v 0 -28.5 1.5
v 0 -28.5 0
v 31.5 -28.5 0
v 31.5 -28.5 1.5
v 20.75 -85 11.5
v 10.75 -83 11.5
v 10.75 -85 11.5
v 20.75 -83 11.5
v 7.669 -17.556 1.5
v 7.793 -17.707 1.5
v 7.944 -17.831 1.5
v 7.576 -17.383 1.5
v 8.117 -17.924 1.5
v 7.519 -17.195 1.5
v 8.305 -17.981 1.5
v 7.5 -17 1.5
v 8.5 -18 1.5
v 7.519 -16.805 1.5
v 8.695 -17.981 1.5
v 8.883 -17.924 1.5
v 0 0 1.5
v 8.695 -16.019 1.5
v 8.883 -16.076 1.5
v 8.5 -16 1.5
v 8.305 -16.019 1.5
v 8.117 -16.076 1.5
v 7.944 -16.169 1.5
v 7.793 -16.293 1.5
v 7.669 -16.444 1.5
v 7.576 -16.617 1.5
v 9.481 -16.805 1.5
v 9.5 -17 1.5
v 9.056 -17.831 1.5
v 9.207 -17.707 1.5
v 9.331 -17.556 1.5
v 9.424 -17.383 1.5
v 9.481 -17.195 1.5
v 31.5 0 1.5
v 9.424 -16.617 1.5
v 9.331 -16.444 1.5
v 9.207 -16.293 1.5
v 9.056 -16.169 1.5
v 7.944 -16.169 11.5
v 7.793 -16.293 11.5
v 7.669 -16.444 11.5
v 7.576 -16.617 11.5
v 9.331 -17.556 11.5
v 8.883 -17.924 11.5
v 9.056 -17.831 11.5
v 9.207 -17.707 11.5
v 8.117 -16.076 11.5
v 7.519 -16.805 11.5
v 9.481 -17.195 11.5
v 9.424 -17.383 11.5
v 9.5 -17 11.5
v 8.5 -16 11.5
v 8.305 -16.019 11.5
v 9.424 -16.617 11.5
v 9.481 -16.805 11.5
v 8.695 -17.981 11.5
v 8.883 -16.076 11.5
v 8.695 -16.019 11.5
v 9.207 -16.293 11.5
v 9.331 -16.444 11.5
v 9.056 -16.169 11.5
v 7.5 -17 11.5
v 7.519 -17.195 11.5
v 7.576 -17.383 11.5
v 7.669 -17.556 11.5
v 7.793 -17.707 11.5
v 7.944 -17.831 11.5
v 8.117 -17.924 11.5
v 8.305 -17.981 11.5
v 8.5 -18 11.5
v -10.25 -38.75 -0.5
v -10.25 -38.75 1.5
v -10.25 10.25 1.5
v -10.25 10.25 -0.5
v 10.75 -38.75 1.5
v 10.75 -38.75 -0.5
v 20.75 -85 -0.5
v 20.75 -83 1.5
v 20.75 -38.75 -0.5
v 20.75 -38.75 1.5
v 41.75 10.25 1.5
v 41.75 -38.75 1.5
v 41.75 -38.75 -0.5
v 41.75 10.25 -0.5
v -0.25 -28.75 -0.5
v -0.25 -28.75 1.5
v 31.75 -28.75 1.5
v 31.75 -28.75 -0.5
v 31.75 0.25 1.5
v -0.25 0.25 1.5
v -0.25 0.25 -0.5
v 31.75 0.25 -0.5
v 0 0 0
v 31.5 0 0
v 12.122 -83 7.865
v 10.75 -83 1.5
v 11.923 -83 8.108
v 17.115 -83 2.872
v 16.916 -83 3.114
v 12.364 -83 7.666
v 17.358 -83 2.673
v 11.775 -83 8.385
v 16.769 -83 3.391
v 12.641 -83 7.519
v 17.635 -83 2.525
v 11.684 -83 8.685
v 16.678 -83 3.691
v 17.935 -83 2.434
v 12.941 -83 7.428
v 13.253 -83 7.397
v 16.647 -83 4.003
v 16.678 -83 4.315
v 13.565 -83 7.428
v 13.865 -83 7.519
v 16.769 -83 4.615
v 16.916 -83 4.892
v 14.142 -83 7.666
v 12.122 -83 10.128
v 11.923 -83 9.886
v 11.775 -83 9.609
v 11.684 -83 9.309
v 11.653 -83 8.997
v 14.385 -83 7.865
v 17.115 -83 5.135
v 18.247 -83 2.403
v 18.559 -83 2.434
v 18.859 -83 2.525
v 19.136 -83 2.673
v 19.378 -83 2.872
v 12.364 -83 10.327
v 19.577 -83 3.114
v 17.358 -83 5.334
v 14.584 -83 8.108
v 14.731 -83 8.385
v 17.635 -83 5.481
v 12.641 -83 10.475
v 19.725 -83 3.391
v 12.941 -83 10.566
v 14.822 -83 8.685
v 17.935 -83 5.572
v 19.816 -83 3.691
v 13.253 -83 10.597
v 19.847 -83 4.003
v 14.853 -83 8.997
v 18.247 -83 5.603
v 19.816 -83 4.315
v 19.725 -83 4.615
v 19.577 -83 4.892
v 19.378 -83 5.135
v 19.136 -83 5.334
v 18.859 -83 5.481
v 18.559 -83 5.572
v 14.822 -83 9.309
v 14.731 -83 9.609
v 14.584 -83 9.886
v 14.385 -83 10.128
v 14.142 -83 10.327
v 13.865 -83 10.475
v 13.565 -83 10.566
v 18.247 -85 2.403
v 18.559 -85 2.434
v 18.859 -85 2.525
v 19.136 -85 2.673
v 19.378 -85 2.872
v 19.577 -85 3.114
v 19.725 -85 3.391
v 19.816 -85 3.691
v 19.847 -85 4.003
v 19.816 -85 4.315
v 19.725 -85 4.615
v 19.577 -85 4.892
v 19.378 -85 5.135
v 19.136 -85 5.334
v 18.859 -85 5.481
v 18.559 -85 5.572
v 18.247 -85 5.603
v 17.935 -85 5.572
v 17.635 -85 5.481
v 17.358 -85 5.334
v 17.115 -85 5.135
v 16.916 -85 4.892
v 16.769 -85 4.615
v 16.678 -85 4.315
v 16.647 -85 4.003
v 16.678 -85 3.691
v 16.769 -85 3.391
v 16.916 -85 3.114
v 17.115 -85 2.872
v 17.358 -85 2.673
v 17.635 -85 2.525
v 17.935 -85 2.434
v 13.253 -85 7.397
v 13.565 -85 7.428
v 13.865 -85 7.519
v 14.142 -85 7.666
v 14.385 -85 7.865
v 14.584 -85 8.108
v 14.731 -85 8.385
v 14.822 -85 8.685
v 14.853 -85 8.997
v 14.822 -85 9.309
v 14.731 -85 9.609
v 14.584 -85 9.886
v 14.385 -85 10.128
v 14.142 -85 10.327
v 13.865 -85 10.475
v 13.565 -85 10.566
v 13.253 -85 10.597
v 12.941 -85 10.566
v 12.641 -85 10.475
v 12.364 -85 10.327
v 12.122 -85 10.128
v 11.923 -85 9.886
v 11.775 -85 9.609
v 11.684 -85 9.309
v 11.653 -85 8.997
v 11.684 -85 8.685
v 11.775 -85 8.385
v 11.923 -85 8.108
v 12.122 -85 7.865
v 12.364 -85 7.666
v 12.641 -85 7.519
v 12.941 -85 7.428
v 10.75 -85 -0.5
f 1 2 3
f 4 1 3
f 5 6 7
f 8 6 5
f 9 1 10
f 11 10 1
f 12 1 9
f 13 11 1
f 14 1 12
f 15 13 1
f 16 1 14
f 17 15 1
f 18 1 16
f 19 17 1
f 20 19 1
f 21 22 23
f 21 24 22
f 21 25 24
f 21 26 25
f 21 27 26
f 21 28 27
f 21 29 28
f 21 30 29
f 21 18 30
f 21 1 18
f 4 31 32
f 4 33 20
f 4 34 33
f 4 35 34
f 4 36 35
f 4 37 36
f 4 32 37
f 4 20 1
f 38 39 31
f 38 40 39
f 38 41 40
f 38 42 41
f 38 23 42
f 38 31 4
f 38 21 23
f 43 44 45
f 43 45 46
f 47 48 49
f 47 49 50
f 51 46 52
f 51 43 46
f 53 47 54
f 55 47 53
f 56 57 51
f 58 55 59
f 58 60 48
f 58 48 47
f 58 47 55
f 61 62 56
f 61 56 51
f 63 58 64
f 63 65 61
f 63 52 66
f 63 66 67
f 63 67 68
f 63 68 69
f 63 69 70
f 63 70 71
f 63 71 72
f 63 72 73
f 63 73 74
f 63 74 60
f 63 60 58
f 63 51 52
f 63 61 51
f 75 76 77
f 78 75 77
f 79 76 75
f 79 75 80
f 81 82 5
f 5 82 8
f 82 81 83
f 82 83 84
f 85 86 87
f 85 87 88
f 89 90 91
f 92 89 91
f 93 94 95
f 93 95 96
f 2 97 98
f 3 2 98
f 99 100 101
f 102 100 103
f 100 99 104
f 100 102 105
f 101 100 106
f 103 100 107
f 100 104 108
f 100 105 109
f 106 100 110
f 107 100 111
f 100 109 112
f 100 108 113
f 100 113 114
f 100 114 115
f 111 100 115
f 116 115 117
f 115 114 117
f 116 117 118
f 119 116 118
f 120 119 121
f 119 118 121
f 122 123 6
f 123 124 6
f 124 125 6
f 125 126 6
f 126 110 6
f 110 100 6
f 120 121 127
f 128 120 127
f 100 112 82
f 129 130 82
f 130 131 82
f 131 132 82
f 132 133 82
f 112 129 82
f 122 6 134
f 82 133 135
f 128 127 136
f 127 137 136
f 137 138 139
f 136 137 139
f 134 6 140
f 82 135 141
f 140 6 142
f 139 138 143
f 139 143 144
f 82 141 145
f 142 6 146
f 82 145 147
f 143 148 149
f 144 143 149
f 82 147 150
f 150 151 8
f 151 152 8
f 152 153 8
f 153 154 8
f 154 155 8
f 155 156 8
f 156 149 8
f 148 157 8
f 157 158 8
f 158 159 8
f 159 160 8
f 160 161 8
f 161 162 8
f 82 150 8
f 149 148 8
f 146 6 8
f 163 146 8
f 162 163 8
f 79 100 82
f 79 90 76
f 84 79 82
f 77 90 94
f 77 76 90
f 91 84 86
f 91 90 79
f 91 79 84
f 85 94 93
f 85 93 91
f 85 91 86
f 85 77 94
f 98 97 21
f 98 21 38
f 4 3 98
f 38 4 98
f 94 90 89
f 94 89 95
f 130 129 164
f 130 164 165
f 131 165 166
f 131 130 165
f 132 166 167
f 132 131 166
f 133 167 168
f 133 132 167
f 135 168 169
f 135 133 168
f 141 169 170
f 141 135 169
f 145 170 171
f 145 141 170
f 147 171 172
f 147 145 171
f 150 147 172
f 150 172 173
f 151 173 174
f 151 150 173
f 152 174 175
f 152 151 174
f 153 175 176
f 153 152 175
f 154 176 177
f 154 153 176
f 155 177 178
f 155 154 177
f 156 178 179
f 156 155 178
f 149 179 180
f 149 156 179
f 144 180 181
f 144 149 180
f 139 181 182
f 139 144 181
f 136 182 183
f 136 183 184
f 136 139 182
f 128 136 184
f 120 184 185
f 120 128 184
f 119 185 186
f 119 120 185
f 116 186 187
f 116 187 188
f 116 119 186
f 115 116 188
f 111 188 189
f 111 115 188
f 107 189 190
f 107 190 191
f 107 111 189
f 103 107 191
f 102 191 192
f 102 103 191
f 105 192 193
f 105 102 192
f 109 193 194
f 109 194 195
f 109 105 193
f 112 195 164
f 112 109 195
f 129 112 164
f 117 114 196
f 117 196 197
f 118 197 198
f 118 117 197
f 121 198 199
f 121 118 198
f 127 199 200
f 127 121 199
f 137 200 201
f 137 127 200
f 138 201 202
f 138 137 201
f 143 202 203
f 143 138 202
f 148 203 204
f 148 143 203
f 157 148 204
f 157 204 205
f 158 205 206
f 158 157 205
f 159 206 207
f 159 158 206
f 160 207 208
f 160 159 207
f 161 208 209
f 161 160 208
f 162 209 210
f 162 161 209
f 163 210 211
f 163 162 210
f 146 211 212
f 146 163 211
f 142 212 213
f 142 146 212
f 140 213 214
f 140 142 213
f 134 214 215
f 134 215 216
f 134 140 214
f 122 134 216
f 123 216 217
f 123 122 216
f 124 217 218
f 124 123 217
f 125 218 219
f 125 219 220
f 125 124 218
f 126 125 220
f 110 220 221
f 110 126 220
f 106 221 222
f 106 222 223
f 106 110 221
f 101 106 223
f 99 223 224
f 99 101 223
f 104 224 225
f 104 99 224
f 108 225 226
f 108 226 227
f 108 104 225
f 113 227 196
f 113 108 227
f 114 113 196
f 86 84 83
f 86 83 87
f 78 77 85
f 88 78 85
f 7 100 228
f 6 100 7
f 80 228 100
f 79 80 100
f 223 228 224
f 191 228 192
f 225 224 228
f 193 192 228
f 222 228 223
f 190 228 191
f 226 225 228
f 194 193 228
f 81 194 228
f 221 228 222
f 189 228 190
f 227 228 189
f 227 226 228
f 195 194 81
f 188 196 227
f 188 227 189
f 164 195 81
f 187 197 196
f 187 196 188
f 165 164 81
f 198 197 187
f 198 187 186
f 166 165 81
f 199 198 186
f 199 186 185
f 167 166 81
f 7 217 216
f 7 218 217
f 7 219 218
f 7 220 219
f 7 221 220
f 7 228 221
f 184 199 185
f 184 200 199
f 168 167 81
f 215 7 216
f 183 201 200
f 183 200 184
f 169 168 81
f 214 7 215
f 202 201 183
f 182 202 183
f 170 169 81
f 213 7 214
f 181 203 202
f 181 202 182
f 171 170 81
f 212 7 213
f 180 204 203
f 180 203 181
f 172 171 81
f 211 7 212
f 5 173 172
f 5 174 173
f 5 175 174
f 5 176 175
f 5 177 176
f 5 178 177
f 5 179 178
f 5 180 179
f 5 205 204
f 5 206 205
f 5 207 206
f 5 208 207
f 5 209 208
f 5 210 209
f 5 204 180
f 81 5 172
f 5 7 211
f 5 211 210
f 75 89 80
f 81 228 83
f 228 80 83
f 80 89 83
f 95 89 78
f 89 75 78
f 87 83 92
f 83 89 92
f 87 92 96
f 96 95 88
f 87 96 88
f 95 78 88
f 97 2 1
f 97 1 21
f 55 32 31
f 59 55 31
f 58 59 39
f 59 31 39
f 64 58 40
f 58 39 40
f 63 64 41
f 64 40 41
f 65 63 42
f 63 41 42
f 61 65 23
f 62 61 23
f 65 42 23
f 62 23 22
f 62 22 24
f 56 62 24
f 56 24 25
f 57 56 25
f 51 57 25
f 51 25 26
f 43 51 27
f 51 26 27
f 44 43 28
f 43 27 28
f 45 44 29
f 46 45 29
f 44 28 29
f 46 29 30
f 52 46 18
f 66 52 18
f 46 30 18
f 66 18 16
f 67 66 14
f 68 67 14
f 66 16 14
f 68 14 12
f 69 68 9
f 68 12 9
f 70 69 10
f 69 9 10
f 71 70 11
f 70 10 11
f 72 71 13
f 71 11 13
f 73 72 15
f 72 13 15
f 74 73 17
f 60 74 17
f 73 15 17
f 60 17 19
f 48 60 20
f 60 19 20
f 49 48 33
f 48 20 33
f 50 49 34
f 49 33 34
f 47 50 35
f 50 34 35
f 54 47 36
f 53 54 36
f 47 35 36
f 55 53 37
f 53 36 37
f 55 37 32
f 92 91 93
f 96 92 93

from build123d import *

# Parameters (mm, degrees)
SKETCH1_W           = 31.5
SKETCH1_H           = 28.5
BOSS_EXTRUDE2_DEPTH = 1.5
SKETCH3_R           = 1
BOSS_EXTRUDE3_DEPTH = 10
SKETCH4_W           = 52
SKETCH4_H           = 49
SKETCH4_W_2         = 32
SKETCH4_H_2         = 29
BOSS_EXTRUDE4_DEPTH = 2
SKETCH6_W           = 10
SKETCH6_H           = 2
BOSS_EXTRUDE5_DEPTH = 44.25
SKETCH7_W           = 10
SKETCH7_H           = 12
SKETCH7_R           = 1.6
BOSS_EXTRUDE6_DEPTH = 2


with BuildPart() as part:
    # Sketch1 → Boss-Extrude2 (new body)
    with BuildSketch(Plane.XY):
        with Locations((15.75, -14.25)):
            Rectangle(SKETCH1_W, SKETCH1_H)
    extrude(amount=BOSS_EXTRUDE2_DEPTH)

    # Sketch3 → Boss-Extrude3 (add)
    with BuildSketch(Plane.XY.offset(1.5)):
        with Locations((8.5, -17)):
            Circle(SKETCH3_R)
    extrude(amount=BOSS_EXTRUDE3_DEPTH)


with BuildPart() as body_2:
    # Sketch4 → Boss-Extrude4 (new body)
    with BuildSketch(Plane.XY.offset(1.5)):
        with Locations((15.75, -14.25)):
            Rectangle(SKETCH4_W, SKETCH4_H)
        with Locations((15.75, -14.25)):
            Rectangle(SKETCH4_W_2, SKETCH4_H_2, mode=Mode.SUBTRACT)
    extrude(amount=-BOSS_EXTRUDE4_DEPTH)

    # Sketch6 → Boss-Extrude5 (add)
    with BuildSketch(Plane.XZ.offset(38.75)):
        with Locations((15.75, 0.5)):
            Rectangle(SKETCH6_W, SKETCH6_H)
    extrude(amount=BOSS_EXTRUDE5_DEPTH)

    # Sketch7 → Boss-Extrude6 (add)
    with BuildSketch(Plane.XZ.offset(83)):
        with Locations((15.75, 5.5)):
            Rectangle(SKETCH7_W, SKETCH7_H)
        with Locations(Location((13.253158005, 8.996841995, 0), (0, 0, 270))):
            Circle(SKETCH7_R, mode=Mode.SUBTRACT)
        with Locations(Location((18.246841995, 4.003158005, 0), (0, 0, 270))):
            Circle(SKETCH7_R, mode=Mode.SUBTRACT)
    extrude(amount=BOSS_EXTRUDE6_DEPTH)


solid = Compound([part.part, body_2.part])
